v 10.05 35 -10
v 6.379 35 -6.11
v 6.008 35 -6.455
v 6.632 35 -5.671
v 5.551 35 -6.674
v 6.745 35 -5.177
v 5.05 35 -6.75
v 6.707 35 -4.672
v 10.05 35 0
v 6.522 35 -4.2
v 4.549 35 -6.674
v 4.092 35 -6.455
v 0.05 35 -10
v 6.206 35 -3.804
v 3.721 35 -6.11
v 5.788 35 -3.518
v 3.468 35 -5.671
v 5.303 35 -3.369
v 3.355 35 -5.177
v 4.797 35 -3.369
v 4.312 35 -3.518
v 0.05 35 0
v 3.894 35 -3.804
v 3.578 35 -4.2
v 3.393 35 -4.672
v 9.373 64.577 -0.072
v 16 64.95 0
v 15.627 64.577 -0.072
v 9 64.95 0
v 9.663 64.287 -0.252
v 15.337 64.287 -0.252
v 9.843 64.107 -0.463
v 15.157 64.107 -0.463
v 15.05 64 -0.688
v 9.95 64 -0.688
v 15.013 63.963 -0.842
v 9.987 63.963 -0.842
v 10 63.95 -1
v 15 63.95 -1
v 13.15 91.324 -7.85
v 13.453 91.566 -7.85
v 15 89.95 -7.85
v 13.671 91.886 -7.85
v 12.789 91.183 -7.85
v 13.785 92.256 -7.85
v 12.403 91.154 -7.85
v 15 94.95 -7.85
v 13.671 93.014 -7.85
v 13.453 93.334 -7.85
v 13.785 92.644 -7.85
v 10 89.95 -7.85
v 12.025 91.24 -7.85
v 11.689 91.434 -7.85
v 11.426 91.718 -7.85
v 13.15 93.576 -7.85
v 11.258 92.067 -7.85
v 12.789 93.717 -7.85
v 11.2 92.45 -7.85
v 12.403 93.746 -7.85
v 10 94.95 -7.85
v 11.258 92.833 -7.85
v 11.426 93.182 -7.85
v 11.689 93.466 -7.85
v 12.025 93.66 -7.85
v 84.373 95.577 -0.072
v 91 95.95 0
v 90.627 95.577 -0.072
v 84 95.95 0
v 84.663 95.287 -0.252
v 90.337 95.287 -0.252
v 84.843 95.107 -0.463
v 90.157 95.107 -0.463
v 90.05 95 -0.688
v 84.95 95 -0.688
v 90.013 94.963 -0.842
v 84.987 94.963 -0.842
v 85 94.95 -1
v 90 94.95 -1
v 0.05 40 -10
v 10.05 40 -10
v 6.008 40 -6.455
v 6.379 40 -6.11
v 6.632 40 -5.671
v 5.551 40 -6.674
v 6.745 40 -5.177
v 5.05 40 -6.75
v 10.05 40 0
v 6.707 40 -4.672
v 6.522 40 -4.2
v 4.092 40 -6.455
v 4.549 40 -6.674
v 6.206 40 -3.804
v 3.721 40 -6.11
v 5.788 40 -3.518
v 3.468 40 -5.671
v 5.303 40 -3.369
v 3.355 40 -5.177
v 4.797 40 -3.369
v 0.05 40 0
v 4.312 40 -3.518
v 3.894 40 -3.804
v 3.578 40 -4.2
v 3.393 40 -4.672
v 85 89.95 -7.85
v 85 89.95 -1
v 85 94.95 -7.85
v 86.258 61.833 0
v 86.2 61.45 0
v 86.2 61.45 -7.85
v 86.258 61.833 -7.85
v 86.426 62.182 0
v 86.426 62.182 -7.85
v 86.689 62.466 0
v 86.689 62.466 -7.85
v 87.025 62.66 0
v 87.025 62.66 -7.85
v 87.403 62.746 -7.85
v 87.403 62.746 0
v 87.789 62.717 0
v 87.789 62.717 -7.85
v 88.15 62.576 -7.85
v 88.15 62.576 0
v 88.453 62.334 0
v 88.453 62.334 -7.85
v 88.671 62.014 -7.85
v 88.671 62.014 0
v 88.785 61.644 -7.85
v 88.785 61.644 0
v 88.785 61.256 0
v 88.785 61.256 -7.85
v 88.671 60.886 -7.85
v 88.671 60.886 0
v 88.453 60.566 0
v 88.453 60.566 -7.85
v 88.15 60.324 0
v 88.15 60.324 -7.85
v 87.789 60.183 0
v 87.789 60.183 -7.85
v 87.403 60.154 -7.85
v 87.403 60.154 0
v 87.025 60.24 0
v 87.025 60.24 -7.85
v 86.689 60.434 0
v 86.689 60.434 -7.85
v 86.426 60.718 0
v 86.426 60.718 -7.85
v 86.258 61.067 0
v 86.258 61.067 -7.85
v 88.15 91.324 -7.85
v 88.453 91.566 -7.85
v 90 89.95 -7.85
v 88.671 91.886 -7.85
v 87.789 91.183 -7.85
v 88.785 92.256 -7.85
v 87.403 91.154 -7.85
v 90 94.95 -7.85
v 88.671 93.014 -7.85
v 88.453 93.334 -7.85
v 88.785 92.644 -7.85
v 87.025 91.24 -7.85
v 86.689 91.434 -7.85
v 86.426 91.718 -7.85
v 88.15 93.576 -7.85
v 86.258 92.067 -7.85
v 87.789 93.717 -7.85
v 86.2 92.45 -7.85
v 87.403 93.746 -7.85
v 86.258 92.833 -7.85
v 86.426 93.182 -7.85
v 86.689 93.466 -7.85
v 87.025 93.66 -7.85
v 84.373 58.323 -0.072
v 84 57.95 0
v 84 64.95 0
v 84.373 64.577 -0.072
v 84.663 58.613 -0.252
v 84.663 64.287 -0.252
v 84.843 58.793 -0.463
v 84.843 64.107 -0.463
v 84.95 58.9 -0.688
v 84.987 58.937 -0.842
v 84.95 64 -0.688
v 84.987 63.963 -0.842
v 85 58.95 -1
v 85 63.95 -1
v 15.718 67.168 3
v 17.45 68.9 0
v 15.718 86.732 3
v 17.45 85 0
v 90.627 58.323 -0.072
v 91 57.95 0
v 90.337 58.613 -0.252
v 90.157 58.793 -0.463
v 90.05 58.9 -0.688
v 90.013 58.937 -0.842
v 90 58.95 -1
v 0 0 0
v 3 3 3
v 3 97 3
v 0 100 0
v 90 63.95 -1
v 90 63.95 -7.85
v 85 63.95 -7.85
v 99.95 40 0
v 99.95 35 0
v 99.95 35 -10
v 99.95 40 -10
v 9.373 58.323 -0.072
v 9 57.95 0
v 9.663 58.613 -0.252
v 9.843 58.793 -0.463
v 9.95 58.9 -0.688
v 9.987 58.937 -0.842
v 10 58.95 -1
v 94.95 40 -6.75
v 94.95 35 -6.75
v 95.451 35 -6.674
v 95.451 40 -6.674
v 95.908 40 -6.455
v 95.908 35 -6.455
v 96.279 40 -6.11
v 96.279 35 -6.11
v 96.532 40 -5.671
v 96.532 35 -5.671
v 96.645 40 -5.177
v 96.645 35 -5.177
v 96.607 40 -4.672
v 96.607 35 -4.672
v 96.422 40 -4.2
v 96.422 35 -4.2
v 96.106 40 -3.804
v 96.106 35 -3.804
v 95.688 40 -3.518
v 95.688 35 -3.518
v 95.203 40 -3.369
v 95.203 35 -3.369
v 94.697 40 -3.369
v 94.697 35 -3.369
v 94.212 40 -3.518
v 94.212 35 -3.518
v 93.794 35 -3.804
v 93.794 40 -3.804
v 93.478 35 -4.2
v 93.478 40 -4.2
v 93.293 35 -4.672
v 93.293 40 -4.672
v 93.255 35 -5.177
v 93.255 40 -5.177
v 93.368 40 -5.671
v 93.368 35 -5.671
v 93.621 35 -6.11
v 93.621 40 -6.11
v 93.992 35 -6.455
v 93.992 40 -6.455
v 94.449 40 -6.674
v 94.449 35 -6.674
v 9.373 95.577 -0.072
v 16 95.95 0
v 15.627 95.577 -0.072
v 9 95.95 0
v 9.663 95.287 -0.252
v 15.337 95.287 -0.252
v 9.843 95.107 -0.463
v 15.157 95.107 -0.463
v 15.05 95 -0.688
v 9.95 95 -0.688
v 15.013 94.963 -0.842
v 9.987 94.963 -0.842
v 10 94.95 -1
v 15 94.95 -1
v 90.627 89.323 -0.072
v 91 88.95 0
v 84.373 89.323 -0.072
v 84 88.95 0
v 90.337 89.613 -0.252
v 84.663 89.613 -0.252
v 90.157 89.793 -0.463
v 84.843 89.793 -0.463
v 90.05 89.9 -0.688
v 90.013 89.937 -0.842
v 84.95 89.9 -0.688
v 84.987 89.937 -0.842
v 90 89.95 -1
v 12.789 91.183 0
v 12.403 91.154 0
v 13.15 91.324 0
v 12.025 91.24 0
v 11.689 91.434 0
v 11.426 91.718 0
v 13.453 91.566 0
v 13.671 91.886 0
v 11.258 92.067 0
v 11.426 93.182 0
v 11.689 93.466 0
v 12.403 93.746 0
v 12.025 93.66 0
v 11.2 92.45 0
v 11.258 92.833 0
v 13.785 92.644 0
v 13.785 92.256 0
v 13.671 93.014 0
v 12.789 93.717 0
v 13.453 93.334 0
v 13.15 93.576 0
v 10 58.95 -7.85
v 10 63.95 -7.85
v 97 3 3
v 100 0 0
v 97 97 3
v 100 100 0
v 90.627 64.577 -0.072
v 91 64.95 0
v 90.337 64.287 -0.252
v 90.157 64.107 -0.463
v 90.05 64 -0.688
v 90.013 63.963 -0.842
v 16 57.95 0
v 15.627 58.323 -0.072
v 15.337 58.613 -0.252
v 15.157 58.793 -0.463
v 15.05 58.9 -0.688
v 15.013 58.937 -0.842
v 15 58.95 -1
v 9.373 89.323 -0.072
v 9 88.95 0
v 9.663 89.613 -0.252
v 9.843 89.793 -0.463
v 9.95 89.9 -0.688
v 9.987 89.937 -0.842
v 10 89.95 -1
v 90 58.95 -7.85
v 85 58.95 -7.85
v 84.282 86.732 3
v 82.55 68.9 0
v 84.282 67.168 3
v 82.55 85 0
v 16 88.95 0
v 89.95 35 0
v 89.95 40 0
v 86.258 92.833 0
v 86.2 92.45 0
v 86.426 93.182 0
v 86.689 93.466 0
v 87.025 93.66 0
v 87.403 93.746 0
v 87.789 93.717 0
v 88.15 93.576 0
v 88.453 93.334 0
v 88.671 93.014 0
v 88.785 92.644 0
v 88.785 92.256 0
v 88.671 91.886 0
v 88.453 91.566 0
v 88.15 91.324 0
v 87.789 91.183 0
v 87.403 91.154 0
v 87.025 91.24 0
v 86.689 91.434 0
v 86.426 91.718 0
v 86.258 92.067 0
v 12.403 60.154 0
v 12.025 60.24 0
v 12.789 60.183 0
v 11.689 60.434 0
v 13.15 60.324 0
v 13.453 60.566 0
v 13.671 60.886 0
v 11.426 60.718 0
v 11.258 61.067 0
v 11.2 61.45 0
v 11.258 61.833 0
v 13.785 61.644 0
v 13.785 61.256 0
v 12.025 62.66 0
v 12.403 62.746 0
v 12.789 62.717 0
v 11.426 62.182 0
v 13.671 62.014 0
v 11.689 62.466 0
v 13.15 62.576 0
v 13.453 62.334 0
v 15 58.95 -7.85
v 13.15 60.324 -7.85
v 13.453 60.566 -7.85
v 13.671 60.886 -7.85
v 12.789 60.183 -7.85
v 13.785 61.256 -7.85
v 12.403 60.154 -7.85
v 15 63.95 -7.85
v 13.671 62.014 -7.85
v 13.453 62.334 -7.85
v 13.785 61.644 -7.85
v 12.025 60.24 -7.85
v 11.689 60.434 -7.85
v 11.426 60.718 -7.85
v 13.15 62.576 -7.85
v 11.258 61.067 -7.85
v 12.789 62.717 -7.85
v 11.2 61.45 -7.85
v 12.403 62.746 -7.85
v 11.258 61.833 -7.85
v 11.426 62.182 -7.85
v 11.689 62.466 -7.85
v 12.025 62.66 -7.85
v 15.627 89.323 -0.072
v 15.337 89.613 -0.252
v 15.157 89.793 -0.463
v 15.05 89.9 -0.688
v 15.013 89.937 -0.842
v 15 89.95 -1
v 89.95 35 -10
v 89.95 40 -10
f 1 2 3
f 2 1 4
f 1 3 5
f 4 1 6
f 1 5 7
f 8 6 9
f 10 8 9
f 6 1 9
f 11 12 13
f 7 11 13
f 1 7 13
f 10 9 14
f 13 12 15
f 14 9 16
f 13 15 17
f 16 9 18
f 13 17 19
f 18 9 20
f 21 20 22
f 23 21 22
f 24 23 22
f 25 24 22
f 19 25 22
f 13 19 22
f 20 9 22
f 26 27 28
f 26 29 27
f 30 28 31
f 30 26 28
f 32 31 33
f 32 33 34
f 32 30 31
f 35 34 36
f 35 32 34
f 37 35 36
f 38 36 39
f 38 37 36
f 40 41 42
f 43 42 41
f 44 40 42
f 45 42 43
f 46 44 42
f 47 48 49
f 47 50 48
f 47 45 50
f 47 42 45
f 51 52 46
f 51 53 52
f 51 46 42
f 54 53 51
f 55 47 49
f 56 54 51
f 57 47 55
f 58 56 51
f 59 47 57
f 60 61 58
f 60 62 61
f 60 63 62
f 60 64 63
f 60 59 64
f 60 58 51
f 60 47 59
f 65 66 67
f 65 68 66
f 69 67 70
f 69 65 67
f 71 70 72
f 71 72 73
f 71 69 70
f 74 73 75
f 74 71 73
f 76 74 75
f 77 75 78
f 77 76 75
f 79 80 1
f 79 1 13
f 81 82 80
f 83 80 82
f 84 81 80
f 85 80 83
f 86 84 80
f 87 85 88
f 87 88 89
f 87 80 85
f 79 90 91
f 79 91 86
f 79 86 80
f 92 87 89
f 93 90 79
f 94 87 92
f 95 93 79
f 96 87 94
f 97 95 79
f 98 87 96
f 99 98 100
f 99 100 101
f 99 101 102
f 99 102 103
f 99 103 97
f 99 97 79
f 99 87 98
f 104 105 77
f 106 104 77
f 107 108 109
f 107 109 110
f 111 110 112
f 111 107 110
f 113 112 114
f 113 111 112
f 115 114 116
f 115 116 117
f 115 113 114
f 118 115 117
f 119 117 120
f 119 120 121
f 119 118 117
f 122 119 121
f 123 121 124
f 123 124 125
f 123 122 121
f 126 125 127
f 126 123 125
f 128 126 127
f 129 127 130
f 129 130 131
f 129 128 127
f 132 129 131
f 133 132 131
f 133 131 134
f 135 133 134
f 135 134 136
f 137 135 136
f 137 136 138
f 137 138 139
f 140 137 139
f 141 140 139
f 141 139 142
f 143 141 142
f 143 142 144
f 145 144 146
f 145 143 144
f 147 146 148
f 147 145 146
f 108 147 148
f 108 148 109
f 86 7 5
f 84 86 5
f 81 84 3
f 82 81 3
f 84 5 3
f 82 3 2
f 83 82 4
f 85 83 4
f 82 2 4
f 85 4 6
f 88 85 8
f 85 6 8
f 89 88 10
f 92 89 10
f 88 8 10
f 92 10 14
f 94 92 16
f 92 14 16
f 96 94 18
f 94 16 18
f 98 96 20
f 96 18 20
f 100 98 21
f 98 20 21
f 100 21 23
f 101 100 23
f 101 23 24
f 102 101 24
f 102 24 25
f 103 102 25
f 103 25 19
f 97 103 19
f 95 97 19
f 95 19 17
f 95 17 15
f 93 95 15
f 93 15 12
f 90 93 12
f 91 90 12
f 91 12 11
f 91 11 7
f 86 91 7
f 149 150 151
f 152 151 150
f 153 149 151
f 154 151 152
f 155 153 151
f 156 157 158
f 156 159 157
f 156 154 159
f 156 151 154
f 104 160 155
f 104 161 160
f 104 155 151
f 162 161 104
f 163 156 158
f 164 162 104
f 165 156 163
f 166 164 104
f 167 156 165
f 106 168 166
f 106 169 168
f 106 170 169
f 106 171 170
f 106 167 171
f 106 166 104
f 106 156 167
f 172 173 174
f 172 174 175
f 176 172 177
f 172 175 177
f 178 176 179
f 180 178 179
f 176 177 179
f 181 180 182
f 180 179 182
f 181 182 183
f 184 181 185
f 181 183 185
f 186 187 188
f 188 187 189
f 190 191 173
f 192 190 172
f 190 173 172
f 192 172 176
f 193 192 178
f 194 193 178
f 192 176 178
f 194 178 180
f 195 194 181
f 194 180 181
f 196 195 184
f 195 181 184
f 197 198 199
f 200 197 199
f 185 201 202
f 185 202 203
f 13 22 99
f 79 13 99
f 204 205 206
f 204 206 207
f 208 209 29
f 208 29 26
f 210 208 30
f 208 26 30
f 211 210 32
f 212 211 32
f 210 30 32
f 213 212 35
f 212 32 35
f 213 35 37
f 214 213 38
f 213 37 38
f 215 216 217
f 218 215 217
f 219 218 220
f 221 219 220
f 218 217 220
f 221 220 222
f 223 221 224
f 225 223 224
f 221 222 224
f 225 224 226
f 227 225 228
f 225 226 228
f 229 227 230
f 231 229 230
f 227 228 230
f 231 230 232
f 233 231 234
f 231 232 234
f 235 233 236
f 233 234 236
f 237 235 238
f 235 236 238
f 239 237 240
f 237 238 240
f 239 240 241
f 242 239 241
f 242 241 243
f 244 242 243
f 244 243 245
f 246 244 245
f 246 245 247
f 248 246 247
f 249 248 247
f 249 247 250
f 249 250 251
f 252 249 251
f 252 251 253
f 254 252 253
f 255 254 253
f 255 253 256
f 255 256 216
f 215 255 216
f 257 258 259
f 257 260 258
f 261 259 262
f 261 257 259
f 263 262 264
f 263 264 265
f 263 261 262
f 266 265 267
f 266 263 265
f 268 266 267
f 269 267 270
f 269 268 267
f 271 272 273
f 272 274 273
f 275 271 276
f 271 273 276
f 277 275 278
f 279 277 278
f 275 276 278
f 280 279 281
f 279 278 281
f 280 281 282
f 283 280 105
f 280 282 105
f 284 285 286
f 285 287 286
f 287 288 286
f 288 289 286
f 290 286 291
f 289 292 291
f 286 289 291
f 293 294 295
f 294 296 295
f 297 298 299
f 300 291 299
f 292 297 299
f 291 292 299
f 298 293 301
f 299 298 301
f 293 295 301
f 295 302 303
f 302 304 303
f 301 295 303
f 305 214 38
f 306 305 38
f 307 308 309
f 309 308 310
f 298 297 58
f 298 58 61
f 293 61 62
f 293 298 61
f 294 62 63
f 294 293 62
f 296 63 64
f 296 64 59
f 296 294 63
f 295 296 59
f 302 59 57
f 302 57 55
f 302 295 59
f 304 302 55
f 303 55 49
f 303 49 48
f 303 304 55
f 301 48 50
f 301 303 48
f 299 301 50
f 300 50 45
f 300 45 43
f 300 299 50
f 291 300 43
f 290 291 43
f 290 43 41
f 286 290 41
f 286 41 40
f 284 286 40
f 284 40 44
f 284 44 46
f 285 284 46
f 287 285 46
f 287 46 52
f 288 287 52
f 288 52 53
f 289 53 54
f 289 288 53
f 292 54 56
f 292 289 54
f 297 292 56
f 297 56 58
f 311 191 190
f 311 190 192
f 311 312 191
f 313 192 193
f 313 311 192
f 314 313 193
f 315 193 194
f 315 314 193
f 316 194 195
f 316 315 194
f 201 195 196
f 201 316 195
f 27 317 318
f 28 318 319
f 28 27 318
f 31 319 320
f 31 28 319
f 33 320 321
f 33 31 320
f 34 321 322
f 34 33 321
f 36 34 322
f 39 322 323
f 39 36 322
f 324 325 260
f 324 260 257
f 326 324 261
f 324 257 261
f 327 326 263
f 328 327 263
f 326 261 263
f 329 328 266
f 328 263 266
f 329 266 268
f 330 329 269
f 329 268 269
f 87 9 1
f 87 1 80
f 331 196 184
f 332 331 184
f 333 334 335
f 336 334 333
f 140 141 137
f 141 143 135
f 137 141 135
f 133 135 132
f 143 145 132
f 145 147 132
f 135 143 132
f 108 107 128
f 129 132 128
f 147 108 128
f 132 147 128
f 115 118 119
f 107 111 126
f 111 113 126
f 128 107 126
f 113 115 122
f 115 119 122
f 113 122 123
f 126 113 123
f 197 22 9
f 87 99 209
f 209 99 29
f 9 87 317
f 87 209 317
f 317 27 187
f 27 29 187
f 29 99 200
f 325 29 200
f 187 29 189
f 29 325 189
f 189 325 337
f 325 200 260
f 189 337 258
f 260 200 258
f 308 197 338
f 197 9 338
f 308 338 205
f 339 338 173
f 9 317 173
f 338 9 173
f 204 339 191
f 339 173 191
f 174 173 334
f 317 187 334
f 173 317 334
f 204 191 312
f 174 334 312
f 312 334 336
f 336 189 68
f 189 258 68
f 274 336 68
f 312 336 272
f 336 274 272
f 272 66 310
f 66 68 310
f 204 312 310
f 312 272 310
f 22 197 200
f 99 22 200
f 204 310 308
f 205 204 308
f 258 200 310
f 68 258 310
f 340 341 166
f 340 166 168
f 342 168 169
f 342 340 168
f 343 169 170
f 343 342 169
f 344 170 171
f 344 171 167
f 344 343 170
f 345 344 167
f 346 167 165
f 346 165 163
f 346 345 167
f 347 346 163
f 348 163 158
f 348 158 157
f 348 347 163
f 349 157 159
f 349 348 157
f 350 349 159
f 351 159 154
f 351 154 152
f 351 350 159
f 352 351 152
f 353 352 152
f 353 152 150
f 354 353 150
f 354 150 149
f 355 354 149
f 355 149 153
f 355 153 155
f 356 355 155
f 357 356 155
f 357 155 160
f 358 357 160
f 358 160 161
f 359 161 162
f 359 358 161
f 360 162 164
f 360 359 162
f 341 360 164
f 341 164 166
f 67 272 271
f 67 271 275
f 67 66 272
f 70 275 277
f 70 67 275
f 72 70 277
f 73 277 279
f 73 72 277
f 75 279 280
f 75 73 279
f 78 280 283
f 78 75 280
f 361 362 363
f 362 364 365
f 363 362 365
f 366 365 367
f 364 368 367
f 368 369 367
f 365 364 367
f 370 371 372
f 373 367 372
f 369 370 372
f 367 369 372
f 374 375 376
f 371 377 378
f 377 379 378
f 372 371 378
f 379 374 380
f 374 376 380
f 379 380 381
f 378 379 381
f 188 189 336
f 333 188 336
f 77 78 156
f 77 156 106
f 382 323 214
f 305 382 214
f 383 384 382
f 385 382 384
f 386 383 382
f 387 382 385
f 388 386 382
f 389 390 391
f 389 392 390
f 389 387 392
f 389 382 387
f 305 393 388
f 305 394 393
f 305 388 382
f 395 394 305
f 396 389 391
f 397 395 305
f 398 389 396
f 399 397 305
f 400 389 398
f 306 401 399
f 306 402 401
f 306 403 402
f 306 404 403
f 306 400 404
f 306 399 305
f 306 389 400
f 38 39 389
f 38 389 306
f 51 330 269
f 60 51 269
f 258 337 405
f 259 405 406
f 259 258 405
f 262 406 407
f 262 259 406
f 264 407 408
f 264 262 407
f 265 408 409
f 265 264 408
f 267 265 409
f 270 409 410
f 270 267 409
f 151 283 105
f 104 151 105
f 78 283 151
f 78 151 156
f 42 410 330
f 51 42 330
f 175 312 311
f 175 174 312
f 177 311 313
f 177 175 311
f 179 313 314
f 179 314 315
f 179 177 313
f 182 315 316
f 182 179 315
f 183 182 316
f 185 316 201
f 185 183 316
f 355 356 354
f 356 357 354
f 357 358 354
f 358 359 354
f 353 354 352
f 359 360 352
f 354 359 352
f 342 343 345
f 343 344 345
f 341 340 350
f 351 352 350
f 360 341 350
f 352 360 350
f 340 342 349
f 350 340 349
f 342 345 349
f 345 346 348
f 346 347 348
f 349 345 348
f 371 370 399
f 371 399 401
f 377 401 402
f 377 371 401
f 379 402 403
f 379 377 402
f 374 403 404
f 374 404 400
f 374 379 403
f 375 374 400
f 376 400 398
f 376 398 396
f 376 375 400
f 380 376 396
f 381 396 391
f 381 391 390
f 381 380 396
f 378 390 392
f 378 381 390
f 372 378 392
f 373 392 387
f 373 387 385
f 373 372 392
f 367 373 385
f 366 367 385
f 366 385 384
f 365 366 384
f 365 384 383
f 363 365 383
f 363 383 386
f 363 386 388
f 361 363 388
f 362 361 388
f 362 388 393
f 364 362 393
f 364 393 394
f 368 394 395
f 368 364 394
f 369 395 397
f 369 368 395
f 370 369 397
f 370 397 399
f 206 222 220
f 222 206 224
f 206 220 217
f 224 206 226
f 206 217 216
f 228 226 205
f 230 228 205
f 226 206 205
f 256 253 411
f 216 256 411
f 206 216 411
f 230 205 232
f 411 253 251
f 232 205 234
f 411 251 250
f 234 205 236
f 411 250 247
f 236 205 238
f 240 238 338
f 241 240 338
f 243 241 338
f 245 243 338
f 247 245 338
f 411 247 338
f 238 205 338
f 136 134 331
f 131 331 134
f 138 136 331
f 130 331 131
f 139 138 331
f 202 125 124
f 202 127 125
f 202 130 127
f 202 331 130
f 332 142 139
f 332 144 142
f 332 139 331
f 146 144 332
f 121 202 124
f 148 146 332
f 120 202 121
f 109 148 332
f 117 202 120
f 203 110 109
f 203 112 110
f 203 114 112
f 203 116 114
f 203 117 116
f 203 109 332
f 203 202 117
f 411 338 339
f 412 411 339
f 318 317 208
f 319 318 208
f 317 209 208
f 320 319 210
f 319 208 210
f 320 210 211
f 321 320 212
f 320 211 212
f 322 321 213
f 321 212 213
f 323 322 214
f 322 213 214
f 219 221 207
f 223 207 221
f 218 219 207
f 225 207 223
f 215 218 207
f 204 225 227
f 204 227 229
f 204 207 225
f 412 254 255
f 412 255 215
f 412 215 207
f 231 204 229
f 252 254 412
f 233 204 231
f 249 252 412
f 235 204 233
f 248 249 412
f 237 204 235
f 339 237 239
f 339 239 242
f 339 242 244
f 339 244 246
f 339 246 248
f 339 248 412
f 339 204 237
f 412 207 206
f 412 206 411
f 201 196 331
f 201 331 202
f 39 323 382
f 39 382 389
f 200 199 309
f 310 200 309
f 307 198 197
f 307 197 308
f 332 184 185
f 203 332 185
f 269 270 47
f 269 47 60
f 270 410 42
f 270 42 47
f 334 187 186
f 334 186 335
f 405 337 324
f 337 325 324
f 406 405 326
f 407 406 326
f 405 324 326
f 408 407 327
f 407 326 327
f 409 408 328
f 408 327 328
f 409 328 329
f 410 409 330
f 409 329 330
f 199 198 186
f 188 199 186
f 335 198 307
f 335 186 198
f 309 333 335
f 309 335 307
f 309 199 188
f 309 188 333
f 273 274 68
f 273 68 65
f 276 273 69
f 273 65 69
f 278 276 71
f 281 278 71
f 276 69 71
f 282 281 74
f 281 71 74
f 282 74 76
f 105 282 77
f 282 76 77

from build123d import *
from OCP.BRepFilletAPI import BRepFilletAPI_MakeChamfer

# Parameters (mm, degrees)
ESQUISSE1_W             = 100
ESQUISSE1_H             = 100
BOSS_EXTRU_1_DEPTH      = 3
ESQUISSE2_W             = 65.1
ESQUISSE2_H             = 16.1
ENL_V_MAT_EXTRU_1_DEPTH = 142.453172464
CHANFREIN1_SIZE         = 3
ESQUISSE3_W             = 5
ESQUISSE3_H             = 5
ESQUISSE3_R             = 1.3
BOSS_EXTRU_2_DEPTH      = 7.85
CHANFREIN2_SIZE         = 1.732050808
CHANFREIN2_SIZE_2       = 3
CONG_1_R                = 1
ESQUISSE4_W             = 10
ESQUISSE4_H             = 5
BOSS_EXTRU_3_DEPTH      = 10
ESQUISSE5_R             = 1.7
ENL_V_MAT_EXTRU_2_DEPTH = 10


with BuildPart() as part:
    # Esquisse1 → Boss.-Extru.1 (new body)
    with BuildSketch(Plane.XY):
        with Locations((50, 50)):
            Rectangle(ESQUISSE1_W, ESQUISSE1_H)
    extrude(amount=BOSS_EXTRU_1_DEPTH)

    # Esquisse2 → Enlèv. mat.-Extru.1 (cut, through all)
    with BuildSketch(Plane.XY.offset(3)):
        with Locations((50, 76.95)):
            Rectangle(ESQUISSE2_W, ESQUISSE2_H)
    extrude(amount=-ENL_V_MAT_EXTRU_1_DEPTH, mode=Mode.SUBTRACT)

    # Chanfrein1
    chanfrein1_edges = [part.edges().sort_by_distance(p)[0] for p in [
        (50, 0, 3),
        (0, 50, 3),
        (50, 100, 3),
        (100, 50, 3),
    ]]
    chamfer(chanfrein1_edges, length=CHANFREIN1_SIZE - 0.0001)  # a hair under: the kernel refuses the full size

    # Esquisse3 → Boss.-Extru.2 (add)
    # profile 1 of 4: a face of its own
    with BuildSketch(Plane(origin=(0, 0, 0), x_dir=(-1, 0, 0), z_dir=(0, 0, -1))):
        with Locations((-87.5, 92.45)):
            Rectangle(ESQUISSE3_W, ESQUISSE3_H)
        with Locations((-87.5, 92.45)):
            Circle(ESQUISSE3_R, mode=Mode.SUBTRACT)
    # profile 2 of 4: a face of its own
    with BuildSketch(Plane(origin=(0, 0, 0), x_dir=(-1, 0, 0), z_dir=(0, 0, -1))):
        with Locations((-12.5, 92.45)):
            Rectangle(ESQUISSE3_W, ESQUISSE3_H)
        with Locations((-12.5, 92.45)):
            Circle(ESQUISSE3_R, mode=Mode.SUBTRACT)
    # profile 3 of 4: a face of its own
    with BuildSketch(Plane(origin=(0, 0, 0), x_dir=(-1, 0, 0), z_dir=(0, 0, -1))):
        with Locations((-87.5, 61.45)):
            Rectangle(ESQUISSE3_W, ESQUISSE3_H)
        with Locations((-87.5, 61.45)):
            Circle(ESQUISSE3_R, mode=Mode.SUBTRACT)
    # profile 4 of 4: a face of its own
    with BuildSketch(Plane(origin=(0, 0, 0), x_dir=(-1, 0, 0), z_dir=(0, 0, -1))):
        with Locations((-12.5, 61.45)):
            Rectangle(ESQUISSE3_W, ESQUISSE3_H)
        with Locations((-12.5, 61.45)):
            Circle(ESQUISSE3_R, mode=Mode.SUBTRACT)
    extrude(amount=BOSS_EXTRU_2_DEPTH)

    # Chanfrein2
    chanfrein2_edges_1 = [part.edges().sort_by_distance(p)[0] for p in [
        (82.55, 76.95, 3),
    ]]
    chanfrein2_side_1 = [part.faces().sort_by_distance(p)[0] for p in [
        (82.584641016, 76.95, 3),
    ]]
    chanfrein2_edges_2 = [part.edges().sort_by_distance(p)[0] for p in [
        (50, 68.9, 3),
    ]]
    chanfrein2_side_2 = [part.faces().sort_by_distance(p)[0] for p in [
        (50, 68.865358984, 3),
    ]]
    chanfrein2_edges_3 = [part.edges().sort_by_distance(p)[0] for p in [
        (17.45, 76.95, 3),
    ]]
    chanfrein2_side_3 = [part.faces().sort_by_distance(p)[0] for p in [
        (17.415358984, 76.95, 3),
    ]]
    chanfrein2_edges_4 = [part.edges().sort_by_distance(p)[0] for p in [
        (50, 85, 3),
    ]]
    chanfrein2_side_4 = [part.faces().sort_by_distance(p)[0] for p in [
        (50, 85.034641016, 3),
    ]]
    chanfrein2 = BRepFilletAPI_MakeChamfer(part.part.solid().wrapped)
    for e in chanfrein2_edges_1:
        chanfrein2.Add(CHANFREIN2_SIZE - 0.0001, CHANFREIN2_SIZE_2 - 0.0001, e.wrapped, chanfrein2_side_1[0].wrapped)
    for e in chanfrein2_edges_2:
        chanfrein2.Add(CHANFREIN2_SIZE - 0.0001, CHANFREIN2_SIZE_2 - 0.0001, e.wrapped, chanfrein2_side_2[0].wrapped)
    for e in chanfrein2_edges_3:
        chanfrein2.Add(CHANFREIN2_SIZE - 0.0001, CHANFREIN2_SIZE_2 - 0.0001, e.wrapped, chanfrein2_side_3[0].wrapped)
    for e in chanfrein2_edges_4:
        chanfrein2.Add(CHANFREIN2_SIZE - 0.0001, CHANFREIN2_SIZE_2 - 0.0001, e.wrapped, chanfrein2_side_4[0].wrapped)
    add(Compound.cast(chanfrein2.Shape()), mode=Mode.REPLACE)  # a hair under: the kernel refuses the full size

    # Congé1
    cong_1_edges = [part.edges().sort_by_distance(p)[0] for p in [
        (90, 92.45, 0),
        (87.5, 89.95, 0),
        (85, 92.45, 0),
        (87.5, 94.95, 0),
        (15, 92.45, 0),
        (12.5, 89.95, 0),
        (10, 92.45, 0),
        (12.5, 94.95, 0),
        (90, 61.45, 0),
        (87.5, 58.95, 0),
        (85, 61.45, 0),
        (87.5, 63.95, 0),
        (15, 61.45, 0),
        (12.5, 58.95, 0),
        (10, 61.45, 0),
        (12.5, 63.95, 0),
    ]]
    fillet(cong_1_edges, radius=CONG_1_R)

    # Esquisse4 → Boss.-Extru.3 (add)
    with BuildSketch(Plane(origin=(0, 0, 0), x_dir=(-1, 0, 0), z_dir=(0, 0, -1))):
        with Locations((-94.95, 37.5)):
            Rectangle(ESQUISSE4_W, ESQUISSE4_H)
        with Locations((-5.05, 37.5)):
            Rectangle(ESQUISSE4_W, ESQUISSE4_H)
    extrude(amount=BOSS_EXTRU_3_DEPTH)

    # Esquisse5 → Enlèv. mat.-Extru.2 (cut)
    with BuildSketch(Plane.XZ.offset(-35)):
        with Locations(Location((94.95, -5.05, 0), (0, 0, 270))):
            Circle(ESQUISSE5_R)
        with Locations(Location((5.05, -5.05, 0), (0, 0, 270))):
            Circle(ESQUISSE5_R)
    extrude(amount=-ENL_V_MAT_EXTRU_2_DEPTH, mode=Mode.SUBTRACT)


solid = part.part
